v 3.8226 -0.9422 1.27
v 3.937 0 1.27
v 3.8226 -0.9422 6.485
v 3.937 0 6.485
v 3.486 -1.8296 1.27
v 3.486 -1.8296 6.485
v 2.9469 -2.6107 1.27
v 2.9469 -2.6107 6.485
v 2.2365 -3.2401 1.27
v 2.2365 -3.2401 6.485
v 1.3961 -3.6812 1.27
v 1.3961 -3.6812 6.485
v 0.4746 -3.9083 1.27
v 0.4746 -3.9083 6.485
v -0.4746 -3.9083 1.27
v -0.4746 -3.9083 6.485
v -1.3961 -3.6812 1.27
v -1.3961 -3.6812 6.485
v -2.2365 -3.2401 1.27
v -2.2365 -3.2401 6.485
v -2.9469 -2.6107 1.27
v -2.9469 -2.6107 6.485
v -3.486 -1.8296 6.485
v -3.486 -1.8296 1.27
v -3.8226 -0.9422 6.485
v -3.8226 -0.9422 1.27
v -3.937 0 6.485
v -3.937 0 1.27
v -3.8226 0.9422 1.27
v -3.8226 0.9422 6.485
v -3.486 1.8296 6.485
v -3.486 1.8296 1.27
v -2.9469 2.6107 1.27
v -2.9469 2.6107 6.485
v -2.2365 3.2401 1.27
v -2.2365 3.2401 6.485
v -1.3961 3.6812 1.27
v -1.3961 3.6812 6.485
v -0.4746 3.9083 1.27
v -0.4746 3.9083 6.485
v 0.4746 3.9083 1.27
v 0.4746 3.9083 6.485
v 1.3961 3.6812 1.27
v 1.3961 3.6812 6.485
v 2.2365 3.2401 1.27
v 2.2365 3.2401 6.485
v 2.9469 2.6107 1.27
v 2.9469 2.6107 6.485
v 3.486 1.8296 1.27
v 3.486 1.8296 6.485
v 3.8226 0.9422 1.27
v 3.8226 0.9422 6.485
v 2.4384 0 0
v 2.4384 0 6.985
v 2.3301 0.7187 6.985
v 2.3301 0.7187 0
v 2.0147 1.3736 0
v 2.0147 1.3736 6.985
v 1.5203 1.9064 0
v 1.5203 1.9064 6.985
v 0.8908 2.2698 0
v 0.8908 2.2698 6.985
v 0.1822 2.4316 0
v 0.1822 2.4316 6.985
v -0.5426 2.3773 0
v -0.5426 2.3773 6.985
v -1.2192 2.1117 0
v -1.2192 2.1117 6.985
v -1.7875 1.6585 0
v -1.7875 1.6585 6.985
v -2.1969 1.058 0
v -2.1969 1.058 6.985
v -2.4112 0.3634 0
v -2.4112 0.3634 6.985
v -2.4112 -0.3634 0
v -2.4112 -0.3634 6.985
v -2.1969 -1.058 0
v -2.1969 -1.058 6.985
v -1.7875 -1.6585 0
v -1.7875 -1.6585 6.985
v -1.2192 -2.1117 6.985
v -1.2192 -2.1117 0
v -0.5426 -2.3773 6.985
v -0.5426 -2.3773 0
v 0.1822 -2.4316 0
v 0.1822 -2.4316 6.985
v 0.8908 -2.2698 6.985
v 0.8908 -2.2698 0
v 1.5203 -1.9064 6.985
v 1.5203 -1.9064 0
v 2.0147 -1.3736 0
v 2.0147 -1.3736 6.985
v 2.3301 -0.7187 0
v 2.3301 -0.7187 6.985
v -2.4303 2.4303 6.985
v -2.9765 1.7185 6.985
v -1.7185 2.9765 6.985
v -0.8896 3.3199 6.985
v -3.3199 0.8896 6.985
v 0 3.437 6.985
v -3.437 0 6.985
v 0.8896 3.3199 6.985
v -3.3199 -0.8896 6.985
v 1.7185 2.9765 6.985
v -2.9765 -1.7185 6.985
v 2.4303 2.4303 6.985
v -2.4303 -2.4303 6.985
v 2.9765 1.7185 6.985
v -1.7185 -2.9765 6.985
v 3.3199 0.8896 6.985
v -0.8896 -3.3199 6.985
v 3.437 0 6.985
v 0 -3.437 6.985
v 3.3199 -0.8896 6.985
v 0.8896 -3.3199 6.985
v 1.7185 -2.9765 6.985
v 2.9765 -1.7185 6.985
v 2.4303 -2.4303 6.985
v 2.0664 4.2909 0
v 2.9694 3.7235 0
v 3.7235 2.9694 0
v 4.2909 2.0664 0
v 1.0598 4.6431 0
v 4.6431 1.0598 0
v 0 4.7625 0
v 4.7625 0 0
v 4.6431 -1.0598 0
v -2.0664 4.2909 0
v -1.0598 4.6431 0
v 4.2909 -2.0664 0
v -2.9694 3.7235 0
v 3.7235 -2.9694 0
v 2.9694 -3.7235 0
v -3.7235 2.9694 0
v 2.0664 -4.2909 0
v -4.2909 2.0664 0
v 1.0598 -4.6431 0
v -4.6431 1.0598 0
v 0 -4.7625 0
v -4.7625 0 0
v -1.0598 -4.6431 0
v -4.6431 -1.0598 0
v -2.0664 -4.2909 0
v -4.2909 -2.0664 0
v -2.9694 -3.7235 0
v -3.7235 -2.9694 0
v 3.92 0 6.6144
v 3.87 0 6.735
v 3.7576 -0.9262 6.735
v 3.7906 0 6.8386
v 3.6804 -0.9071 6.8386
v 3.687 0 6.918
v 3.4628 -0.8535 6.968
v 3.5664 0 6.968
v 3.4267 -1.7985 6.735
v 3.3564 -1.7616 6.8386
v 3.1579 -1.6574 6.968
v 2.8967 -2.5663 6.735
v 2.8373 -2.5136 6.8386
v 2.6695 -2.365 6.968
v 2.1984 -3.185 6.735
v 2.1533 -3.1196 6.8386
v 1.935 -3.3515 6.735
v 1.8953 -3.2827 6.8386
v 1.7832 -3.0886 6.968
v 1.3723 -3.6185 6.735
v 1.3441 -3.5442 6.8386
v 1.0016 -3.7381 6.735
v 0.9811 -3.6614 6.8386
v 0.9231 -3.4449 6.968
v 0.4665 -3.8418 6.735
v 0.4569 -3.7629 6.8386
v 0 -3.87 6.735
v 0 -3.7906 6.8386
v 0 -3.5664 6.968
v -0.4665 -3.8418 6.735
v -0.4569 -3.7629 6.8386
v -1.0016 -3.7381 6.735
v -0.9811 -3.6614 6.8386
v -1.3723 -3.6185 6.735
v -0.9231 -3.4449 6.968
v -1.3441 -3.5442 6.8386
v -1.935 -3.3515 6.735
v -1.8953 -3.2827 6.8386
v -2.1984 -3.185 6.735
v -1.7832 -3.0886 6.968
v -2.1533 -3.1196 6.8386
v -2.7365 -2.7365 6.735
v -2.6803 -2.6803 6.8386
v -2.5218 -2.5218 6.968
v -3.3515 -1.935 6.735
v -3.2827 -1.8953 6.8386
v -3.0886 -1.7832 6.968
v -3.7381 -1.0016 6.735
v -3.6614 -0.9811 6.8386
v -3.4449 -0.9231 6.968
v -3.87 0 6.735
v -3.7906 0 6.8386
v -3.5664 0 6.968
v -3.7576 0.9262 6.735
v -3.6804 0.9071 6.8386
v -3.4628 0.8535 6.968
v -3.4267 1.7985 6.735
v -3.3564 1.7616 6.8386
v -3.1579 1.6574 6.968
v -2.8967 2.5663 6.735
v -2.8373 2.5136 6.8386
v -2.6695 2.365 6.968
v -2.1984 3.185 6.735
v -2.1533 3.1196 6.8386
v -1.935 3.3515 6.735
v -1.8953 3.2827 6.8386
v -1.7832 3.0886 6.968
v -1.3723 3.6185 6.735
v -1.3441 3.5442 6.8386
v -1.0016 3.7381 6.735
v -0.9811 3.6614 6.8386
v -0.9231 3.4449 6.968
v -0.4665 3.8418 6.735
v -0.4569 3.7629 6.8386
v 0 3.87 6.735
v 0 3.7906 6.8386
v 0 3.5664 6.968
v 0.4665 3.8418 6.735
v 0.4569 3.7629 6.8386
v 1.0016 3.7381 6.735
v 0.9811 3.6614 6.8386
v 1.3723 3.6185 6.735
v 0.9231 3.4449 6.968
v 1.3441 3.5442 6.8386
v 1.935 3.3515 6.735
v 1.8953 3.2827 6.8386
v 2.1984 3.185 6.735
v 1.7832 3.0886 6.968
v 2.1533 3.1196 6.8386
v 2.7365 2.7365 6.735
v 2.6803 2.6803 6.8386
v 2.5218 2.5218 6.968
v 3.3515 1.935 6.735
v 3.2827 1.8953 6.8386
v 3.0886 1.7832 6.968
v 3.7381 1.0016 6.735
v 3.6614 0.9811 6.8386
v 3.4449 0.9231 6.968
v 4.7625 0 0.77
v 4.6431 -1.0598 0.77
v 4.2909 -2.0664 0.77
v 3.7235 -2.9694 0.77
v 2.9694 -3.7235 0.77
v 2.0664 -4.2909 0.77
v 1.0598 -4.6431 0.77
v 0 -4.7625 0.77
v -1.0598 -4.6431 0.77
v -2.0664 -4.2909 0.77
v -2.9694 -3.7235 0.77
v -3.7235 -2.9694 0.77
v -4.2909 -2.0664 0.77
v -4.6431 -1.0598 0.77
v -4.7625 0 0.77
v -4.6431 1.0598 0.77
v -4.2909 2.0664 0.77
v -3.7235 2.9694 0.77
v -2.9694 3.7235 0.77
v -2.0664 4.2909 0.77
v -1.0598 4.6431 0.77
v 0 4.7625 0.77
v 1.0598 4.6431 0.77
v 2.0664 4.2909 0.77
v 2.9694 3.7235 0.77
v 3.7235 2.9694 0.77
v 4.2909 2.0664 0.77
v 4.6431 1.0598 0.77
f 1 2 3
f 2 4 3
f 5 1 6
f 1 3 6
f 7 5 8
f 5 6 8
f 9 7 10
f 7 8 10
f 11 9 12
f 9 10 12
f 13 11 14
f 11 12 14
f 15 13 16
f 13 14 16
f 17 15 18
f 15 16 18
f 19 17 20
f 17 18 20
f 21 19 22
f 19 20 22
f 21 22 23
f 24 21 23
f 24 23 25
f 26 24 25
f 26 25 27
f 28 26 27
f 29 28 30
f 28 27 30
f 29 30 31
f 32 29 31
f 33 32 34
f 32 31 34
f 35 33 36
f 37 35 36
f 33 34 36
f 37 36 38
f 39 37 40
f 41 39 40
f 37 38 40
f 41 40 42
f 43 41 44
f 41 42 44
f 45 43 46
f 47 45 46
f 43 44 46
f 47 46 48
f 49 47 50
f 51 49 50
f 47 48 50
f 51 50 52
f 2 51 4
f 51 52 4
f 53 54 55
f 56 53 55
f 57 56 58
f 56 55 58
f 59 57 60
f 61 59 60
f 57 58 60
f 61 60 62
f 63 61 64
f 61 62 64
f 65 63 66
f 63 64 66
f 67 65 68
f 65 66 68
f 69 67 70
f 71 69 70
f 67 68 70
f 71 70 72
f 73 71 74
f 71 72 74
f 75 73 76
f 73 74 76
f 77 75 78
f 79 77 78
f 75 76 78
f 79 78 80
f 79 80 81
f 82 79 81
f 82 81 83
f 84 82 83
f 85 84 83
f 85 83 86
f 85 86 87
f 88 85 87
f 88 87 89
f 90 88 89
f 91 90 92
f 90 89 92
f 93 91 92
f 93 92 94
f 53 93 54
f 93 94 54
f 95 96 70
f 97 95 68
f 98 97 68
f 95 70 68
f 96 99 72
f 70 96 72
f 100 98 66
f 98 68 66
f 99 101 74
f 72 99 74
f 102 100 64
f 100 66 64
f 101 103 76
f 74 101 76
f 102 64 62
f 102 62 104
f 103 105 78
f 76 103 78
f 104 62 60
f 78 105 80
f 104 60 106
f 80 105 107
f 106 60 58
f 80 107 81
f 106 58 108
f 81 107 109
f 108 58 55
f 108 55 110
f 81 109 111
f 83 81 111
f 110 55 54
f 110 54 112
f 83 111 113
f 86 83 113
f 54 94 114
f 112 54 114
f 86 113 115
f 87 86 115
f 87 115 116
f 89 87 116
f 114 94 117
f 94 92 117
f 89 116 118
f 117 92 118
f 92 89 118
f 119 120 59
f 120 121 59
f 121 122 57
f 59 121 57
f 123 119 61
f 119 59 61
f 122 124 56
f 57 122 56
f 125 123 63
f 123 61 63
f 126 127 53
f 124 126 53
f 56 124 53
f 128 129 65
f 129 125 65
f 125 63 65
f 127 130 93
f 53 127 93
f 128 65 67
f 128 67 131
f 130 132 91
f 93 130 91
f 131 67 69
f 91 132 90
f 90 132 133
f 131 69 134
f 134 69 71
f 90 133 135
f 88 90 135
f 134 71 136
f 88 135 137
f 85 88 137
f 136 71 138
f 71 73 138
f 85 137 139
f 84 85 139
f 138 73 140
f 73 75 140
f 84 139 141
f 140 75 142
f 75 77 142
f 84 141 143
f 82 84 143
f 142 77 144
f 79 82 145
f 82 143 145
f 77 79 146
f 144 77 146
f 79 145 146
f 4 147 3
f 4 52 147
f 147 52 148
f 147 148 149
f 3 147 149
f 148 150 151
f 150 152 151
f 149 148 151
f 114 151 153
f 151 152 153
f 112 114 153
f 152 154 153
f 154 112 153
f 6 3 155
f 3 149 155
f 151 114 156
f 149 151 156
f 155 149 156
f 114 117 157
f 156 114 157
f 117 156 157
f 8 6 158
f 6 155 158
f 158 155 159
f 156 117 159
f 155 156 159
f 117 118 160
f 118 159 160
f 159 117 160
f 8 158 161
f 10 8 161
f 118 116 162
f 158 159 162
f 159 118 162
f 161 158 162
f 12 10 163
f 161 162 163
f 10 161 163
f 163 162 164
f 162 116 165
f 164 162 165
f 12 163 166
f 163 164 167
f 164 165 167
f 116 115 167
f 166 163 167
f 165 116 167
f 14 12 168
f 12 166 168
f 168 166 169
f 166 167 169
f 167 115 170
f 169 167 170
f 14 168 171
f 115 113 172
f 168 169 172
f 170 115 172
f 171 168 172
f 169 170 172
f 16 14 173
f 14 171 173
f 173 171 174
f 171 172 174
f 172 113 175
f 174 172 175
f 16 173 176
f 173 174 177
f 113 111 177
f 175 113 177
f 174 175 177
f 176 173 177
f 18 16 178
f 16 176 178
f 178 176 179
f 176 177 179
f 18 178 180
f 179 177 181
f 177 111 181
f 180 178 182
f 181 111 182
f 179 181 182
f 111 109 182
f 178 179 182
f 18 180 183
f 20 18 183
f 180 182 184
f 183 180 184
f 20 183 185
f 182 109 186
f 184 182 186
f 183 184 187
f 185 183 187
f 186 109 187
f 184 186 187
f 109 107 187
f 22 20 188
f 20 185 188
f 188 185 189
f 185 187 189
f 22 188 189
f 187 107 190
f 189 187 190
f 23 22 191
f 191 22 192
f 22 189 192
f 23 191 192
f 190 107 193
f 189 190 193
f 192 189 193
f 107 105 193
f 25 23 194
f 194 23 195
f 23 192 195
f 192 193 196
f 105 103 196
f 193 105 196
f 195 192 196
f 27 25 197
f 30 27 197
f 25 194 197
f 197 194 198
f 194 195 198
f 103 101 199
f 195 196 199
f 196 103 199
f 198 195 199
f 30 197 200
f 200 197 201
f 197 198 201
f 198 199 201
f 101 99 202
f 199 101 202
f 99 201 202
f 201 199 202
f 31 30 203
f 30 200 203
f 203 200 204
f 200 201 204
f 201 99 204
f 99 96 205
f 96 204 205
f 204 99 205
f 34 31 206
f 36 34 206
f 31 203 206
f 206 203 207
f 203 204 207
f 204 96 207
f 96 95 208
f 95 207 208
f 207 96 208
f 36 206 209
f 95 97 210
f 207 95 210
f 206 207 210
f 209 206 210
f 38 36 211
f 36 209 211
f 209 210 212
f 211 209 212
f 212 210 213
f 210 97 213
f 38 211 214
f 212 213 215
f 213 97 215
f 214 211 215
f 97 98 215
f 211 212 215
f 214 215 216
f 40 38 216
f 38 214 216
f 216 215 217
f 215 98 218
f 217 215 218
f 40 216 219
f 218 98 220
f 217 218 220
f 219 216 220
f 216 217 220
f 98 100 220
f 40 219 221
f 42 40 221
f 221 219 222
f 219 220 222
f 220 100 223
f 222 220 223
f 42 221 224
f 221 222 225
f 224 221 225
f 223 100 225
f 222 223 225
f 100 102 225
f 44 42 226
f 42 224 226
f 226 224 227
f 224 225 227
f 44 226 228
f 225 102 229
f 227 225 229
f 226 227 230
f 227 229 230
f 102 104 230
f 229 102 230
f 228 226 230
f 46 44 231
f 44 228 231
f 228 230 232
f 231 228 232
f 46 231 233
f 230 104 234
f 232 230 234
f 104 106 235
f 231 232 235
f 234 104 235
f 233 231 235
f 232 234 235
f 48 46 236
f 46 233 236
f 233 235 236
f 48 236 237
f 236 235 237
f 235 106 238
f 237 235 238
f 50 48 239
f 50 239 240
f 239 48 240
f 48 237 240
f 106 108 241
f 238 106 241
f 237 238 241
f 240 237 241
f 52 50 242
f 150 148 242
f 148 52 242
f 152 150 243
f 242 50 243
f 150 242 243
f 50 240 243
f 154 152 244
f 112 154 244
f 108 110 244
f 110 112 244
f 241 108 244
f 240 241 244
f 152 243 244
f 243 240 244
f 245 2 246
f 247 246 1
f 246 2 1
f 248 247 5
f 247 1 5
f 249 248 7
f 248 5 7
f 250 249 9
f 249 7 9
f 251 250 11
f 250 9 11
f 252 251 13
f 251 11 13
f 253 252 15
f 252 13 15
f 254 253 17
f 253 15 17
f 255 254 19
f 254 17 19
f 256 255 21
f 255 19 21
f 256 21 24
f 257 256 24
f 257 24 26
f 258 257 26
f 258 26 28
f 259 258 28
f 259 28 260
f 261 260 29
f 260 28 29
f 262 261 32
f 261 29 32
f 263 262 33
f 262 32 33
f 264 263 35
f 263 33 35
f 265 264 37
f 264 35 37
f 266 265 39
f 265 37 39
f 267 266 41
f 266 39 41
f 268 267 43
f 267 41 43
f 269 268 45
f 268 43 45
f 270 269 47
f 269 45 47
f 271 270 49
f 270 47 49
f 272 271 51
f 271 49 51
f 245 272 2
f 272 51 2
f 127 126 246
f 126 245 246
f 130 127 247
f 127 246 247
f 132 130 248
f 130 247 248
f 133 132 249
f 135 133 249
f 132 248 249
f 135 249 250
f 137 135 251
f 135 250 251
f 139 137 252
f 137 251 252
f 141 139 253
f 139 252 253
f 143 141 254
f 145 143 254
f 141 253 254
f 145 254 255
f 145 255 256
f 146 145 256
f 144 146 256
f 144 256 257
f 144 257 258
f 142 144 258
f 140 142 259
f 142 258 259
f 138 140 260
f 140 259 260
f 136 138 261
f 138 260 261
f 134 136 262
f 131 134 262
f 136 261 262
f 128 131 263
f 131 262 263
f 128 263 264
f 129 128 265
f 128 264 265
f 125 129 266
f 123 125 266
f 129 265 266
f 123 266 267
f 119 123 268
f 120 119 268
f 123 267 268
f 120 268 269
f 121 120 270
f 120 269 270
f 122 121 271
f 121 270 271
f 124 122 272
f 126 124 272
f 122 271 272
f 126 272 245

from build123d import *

# Parameters (mm, degrees)
F2_R     = 2.4384
F3_DEPTH = 6.985


with BuildPart() as f1:
    # F0 (on Front) → F1 (revolve)
    with BuildSketch(Plane.XZ):
        with BuildLine():
            Line((0, 6.985), (0, 0))
            Line((0, 0), (4.7625, 0))
            Line((4.7625, 0), (4.7625, 0.77))
            Line((4.7625, 0.77), (3.937, 1.27))
            Line((3.937, 1.27), (3.937, 6.485))
            ThreePointArc((3.937, 6.485), (3.790553, 6.838553), (3.437, 6.985))
            Line((3.437, 6.985), (0, 6.985))
        make_face()
    revolve(axis=Axis((0, 0, 3.4925), (0, 0, -1)))

    # F2 (on face) → F3 (cut, through all)
    with BuildSketch(Plane.XY.offset(6.985)):
        Circle(F2_R)
    extrude(amount=-F3_DEPTH, mode=Mode.SUBTRACT)


solid = f1.part
